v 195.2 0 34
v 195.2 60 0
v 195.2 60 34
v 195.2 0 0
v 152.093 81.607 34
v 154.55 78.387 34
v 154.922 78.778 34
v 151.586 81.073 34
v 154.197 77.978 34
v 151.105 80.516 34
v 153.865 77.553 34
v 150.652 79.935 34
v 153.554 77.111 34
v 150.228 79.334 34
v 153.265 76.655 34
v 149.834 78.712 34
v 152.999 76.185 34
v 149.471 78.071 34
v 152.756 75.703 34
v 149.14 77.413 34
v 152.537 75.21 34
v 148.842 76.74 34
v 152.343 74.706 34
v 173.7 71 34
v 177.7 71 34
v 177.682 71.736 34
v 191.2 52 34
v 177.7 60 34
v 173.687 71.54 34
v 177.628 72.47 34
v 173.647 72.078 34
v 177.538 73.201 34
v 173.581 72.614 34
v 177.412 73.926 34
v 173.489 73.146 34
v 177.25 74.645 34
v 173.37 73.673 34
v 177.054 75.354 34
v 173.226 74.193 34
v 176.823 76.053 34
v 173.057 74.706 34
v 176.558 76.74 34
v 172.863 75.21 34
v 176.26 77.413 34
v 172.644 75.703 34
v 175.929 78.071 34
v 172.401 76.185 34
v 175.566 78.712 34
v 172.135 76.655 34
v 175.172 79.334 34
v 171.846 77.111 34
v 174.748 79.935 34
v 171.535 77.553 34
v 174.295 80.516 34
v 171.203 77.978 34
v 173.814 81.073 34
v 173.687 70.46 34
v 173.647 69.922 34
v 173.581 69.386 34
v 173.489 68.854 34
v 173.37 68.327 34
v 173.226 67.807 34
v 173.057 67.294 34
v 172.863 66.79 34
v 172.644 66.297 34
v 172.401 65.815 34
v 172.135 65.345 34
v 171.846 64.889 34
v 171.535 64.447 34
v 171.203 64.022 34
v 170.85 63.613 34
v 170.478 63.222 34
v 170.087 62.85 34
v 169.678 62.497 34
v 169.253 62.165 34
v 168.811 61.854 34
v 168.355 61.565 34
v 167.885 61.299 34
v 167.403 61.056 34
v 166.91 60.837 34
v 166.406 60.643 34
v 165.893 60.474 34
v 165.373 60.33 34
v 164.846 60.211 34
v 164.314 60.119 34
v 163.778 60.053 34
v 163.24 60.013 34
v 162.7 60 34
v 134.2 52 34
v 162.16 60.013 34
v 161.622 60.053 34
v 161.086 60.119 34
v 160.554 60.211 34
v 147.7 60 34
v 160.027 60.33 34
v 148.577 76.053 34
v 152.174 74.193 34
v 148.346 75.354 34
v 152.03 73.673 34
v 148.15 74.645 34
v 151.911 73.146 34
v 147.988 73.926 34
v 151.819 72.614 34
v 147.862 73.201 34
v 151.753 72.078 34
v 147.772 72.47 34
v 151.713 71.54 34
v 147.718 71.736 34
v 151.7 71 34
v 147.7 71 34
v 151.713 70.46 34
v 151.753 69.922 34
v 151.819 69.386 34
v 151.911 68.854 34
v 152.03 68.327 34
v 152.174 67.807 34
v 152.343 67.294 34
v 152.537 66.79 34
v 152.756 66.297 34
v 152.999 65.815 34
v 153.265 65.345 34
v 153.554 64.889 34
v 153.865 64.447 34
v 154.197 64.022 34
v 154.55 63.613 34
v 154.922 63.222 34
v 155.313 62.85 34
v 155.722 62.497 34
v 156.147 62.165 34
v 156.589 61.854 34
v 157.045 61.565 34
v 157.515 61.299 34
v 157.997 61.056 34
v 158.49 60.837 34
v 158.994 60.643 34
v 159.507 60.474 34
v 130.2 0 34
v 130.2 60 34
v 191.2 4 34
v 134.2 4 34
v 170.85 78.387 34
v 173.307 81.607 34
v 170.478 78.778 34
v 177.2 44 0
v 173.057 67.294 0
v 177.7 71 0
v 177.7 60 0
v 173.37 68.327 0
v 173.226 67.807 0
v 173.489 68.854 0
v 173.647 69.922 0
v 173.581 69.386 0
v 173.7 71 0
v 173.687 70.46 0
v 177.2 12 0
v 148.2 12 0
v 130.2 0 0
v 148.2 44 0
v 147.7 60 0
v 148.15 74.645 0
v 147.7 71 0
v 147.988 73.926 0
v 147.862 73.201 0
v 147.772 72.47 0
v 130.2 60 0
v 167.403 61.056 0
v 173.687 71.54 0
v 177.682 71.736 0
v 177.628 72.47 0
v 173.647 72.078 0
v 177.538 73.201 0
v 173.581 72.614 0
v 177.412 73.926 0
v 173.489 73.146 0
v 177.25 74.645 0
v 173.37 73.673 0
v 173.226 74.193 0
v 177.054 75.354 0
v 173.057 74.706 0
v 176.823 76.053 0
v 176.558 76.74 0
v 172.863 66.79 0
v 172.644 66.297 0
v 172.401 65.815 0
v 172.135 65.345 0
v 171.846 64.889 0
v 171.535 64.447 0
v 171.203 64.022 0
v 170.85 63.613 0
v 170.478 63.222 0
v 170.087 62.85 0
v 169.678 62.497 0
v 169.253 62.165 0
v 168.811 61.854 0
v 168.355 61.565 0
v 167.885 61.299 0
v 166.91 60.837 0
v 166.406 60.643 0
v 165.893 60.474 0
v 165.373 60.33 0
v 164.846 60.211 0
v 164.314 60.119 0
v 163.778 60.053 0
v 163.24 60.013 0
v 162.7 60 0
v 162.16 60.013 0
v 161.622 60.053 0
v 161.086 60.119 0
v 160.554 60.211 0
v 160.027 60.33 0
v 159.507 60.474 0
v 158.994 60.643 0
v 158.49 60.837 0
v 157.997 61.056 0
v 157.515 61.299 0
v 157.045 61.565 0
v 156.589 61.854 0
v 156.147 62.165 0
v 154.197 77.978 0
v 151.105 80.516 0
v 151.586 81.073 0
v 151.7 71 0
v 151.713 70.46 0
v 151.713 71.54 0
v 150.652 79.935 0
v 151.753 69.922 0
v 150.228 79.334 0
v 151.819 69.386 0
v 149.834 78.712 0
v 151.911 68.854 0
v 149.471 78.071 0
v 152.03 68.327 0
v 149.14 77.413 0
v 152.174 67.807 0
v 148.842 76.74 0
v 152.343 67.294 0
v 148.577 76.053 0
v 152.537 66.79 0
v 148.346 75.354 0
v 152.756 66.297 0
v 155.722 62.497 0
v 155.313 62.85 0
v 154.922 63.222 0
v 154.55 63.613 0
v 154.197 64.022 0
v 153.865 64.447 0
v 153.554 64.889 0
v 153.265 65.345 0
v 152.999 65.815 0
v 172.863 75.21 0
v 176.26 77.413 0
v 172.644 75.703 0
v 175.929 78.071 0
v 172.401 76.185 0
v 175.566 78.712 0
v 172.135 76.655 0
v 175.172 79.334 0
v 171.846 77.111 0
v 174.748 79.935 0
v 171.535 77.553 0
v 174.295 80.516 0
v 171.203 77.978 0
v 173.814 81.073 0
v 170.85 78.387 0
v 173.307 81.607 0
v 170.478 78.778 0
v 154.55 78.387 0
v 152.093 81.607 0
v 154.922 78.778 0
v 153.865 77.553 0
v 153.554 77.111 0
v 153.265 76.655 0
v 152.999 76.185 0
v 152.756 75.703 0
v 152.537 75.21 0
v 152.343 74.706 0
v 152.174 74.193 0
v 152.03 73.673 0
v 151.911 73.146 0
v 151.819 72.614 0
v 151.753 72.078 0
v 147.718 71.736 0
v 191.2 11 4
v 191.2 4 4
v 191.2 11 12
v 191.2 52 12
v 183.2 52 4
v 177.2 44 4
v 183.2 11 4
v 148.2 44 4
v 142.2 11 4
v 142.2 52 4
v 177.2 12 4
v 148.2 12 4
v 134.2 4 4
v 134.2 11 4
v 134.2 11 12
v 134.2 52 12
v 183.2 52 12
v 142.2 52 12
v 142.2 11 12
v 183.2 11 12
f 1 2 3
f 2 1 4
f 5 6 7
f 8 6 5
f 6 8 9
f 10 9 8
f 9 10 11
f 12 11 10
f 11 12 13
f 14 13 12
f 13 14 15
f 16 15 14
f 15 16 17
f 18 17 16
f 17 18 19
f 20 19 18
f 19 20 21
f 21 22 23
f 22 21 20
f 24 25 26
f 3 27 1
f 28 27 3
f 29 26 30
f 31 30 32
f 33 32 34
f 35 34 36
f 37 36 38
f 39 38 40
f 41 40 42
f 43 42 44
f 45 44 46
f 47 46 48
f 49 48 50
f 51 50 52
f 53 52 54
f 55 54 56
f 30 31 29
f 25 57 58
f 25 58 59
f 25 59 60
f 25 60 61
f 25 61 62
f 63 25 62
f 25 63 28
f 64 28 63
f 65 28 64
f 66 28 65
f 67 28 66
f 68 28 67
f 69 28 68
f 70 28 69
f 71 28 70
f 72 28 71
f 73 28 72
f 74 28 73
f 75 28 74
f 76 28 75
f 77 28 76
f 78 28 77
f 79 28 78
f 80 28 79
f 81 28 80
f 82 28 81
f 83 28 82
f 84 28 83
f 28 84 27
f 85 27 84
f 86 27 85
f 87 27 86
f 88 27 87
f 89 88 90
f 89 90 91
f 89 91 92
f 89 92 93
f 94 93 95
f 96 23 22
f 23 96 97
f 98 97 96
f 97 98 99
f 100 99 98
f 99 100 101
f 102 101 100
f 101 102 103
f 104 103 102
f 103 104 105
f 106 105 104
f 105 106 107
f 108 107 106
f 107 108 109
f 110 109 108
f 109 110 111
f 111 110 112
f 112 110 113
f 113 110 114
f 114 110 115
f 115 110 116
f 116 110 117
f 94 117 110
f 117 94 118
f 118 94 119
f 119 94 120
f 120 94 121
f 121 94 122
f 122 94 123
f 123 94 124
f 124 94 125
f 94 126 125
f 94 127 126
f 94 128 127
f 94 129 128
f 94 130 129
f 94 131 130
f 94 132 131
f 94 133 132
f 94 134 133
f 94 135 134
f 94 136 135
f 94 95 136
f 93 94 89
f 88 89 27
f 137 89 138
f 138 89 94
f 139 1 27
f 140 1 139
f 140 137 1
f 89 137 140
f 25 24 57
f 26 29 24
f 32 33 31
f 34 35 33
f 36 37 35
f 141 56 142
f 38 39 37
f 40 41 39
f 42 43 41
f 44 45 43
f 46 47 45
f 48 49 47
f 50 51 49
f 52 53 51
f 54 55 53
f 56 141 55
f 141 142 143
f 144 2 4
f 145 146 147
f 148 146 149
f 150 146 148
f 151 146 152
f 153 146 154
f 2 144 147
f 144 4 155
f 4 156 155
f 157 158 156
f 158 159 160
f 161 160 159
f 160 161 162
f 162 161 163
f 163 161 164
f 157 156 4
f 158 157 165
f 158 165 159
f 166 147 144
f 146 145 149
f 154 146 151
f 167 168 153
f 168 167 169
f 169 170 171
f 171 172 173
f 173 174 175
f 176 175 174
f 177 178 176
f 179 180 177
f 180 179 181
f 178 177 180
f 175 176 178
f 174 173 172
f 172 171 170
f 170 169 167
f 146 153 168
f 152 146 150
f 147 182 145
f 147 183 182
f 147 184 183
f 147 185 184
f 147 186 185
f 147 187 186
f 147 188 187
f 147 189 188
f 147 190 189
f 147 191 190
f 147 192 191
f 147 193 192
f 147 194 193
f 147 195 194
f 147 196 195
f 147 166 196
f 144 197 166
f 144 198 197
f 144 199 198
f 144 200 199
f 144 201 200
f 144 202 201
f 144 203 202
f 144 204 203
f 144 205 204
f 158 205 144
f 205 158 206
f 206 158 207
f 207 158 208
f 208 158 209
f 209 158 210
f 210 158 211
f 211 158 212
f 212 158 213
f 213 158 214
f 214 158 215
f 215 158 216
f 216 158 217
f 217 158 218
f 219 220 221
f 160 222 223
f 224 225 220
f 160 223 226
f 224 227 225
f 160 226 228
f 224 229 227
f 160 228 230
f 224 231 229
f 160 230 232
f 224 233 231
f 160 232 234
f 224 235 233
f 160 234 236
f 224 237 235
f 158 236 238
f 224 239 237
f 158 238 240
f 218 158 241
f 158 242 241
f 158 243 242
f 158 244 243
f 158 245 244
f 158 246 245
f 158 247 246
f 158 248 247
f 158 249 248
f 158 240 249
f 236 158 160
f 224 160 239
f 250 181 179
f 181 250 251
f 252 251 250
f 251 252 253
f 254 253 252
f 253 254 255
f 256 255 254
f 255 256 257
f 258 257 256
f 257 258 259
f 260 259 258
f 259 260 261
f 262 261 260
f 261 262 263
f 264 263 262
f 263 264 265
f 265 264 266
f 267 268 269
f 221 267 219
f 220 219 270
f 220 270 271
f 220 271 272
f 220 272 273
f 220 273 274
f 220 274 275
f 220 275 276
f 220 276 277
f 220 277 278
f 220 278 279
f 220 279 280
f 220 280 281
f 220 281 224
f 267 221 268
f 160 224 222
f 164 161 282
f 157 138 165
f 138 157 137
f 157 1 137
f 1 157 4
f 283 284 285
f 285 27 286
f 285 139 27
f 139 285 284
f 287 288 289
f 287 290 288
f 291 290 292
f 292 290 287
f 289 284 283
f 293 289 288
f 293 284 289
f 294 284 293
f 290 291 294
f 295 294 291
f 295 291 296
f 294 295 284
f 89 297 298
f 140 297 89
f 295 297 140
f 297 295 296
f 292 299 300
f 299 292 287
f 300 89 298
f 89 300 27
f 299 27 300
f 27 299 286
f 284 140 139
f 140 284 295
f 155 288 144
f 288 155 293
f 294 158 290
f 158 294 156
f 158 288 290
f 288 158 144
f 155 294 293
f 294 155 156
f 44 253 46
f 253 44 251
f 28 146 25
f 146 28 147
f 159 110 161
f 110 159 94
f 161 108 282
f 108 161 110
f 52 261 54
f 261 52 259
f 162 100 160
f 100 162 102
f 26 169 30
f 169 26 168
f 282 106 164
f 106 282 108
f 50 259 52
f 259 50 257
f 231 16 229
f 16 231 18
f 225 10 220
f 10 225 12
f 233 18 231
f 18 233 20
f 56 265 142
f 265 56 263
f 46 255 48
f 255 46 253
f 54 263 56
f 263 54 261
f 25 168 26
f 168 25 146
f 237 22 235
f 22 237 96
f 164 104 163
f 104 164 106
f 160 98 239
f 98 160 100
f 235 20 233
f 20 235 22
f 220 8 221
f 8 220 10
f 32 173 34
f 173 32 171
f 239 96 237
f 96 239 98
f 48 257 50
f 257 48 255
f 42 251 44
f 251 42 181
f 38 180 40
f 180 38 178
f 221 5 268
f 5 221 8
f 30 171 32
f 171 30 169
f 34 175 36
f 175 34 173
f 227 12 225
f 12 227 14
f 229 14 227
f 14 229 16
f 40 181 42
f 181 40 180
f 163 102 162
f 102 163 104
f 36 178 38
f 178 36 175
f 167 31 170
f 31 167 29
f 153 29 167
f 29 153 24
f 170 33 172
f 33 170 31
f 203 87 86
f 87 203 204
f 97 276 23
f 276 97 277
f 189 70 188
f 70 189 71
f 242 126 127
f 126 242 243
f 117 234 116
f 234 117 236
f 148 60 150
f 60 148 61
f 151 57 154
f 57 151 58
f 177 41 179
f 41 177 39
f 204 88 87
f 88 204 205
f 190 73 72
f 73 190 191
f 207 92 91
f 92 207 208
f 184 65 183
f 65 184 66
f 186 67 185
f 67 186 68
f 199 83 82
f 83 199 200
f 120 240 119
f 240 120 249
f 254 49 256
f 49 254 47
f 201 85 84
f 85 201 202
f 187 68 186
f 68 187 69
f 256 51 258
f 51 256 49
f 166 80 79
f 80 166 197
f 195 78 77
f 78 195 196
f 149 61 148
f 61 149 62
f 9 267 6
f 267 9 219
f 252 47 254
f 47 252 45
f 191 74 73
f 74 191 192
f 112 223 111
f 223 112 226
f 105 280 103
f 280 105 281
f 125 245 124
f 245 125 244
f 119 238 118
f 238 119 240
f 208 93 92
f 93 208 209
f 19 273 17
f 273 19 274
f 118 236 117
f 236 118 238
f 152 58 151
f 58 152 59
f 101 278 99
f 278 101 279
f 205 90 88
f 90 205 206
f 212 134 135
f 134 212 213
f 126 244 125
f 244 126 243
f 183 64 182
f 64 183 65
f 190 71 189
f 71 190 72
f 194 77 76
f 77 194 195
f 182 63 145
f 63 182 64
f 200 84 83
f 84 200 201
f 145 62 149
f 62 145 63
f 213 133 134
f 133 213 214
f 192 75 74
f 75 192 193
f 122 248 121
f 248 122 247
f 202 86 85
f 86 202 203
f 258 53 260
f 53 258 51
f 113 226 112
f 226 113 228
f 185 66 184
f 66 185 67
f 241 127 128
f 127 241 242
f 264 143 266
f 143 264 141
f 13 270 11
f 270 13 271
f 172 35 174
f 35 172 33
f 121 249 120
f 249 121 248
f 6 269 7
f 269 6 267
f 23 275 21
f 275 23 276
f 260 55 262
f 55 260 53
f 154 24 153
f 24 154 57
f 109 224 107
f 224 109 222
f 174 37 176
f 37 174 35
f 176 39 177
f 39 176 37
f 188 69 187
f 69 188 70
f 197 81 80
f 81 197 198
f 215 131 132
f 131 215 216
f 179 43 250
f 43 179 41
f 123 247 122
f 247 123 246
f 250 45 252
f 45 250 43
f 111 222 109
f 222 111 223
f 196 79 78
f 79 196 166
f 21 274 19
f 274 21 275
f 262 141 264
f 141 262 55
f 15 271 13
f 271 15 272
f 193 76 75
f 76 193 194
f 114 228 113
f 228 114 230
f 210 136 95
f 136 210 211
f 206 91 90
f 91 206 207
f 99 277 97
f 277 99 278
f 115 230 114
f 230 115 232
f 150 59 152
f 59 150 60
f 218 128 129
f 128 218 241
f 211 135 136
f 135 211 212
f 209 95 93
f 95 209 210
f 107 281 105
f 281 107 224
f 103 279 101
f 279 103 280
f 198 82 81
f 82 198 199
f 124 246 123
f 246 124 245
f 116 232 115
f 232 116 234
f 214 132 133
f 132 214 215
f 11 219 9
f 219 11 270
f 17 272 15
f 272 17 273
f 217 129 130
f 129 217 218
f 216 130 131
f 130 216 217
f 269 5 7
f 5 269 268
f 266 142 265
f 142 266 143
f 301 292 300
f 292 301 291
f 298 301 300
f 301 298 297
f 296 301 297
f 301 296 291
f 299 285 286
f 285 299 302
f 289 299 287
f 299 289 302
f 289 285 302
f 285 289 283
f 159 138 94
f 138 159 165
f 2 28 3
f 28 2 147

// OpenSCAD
$fn= $preview ? 32 : 128;
ps_x = 163;
ps_y = 42;
ps_z = 38;

strain_relief_x = 10;
strain_relief_y = 15;
strain_relief_z = 10;
strain_relief_wall = 2;
cable_diam = 5;

screw_diam=3;
screw_z=5;
screw_thread_diam=4.5;
screw_thread_z = 4;
screw_thread_wall = 2;

toggle_x = 13;
toggle_y = 19.5;
toggle_z = 22;

x_max = 220;

wall_thickness = 2;
space = 3;

holder_wall = 4;
holder_clip_diam = 22;
holder_z = 30;

// psBox();
// translate([1.5*ps_y, 0, 0]) psboxLid();
translate([3.1*ps_y, 0, 0]) psBoxHolder();


module psboxLid() {
    lid_space = 0.1;
    difference() {
        cube([ps_y+2*space+4*wall_thickness, x_max+2*space+4*wall_thickness,3*wall_thickness]);
        difference() {
            translate([wall_thickness - lid_space,wall_thickness - lid_space,2*wall_thickness]) cube([ps_y+2*space+2*wall_thickness+2*lid_space, x_max+2*space+2*wall_thickness+2*lid_space,wall_thickness]);
            translate([2*wall_thickness + lid_space,2*wall_thickness + lid_space,2*wall_thickness]) cube([ps_y+2*space-2*lid_space, x_max+2*space-2*lid_space,wall_thickness]);
        }
        translate([3*wall_thickness,3*wall_thickness,2*wall_thickness]) cube([ps_y + wall_thickness, x_max + wall_thickness,wall_thickness]);
        translate([ps_y/2 - space,27 + wall_thickness,0]) cube([toggle_y, toggle_x,toggle_z]);

    }
}

module psBox() {
    difference() {
        union() {
            difference() {
                cube([ps_y+2*space+2*wall_thickness, x_max+2*space+2*wall_thickness,ps_z + space + wall_thickness]);
                translate([wall_thickness, wall_thickness, wall_thickness]) cube([ps_y+2*space, x_max+2*space,ps_z + space]);
            }
            translate([(ps_y+2*wall_thickness+2*space)-(strain_relief_y+2*strain_relief_wall),wall_thickness,wall_thickness]) cableHole();
            translate([0,x_max+wall_thickness+2*space,wall_thickness]) mirror([0,1,0]) cableHole();

            // 4mm distance for screwhole in pc
            ps_screw_posx = wall_thickness + (screw_thread_diam+screw_thread_wall)/2 + 4; 
            ps_screw_posy = (x_max+wall_thickness+space)-(strain_relief_x+screw_thread_wall) - 5 - 4; // 5 is arbitrary distance

            translate([ps_screw_posx, ps_screw_posy, wall_thickness]) pcScrewThread();
            translate([ps_screw_posx+ps_y-2*4, ps_screw_posy-(ps_x-2*4), wall_thickness]) pcScrewThread();
        }
        translate([(ps_y+2*wall_thickness+2*space)-(strain_relief_y+2*strain_relief_wall)/2,wall_thickness,3*wall_thickness]) rotate([90,0,0]) cylinder(h=wall_thickness, d=cable_diam);
        translate([(strain_relief_y+2*strain_relief_wall)/2,x_max+wall_thickness+2*space+wall_thickness,3*wall_thickness]) rotate([90,0,0]) cylinder(h=wall_thickness, d=cable_diam);
    }
}

module cableHole() {
    difference() {
        cube([strain_relief_y + 2*strain_relief_wall, strain_relief_x + strain_relief_wall, strain_relief_z]);
        translate([strain_relief_wall,0,0])cube([strain_relief_y,strain_relief_x,strain_relief_z]);
        translate([-1, strain_relief_x/2, strain_relief_z/2]) rotate([0,90,0]) cylinder(h=strain_relief_y+2*strain_relief_wall+2, d=cable_diam);
    }
}

module pcScrewThread() {
    difference() {
        cylinder(h=screw_z+1, d=screw_thread_diam+2*screw_thread_wall);
        translate([0,0,1]) cylinder(h=screw_z, d=screw_thread_diam);
    }
}

module psBoxHolder () {
    holder_x = ps_y + 2* space + 4*wall_thickness + 1;
    holder_y = ps_z + 2* space + 2*wall_thickness;    
    holder_rail_z = 8;
    holder_rail_x = 4*wall_thickness;

    union() {
        difference() {
            cube([holder_x + 2*holder_wall, holder_y + 2*holder_wall, holder_z + holder_wall]);
            translate([holder_wall, holder_wall, holder_wall]) cube([holder_x, holder_y, holder_z]);
            translate ([(holder_wall+holder_rail_z)*1.5, holder_wall+holder_rail_z, 0]) cube([(holder_x + 2*holder_wall)-(holder_wall+holder_rail_z)*3, (holder_y + 2*holder_wall)-(holder_wall+holder_rail_z)*2, holder_wall]);
        }

        translate([holder_wall, holder_wall+3*wall_thickness + 1, holder_wall]) cube([holder_rail_x, holder_y - 2*wall_thickness, holder_rail_z]);
        translate([holder_x+holder_wall-holder_rail_x, holder_wall+3*wall_thickness+1, holder_wall]) cube([holder_rail_x, holder_y - 2*wall_thickness, holder_rail_z]);
        
        translate([0,holder_y+2*holder_wall,0])cube([holder_x+2*holder_wall,holder_wall,holder_z+holder_wall]);
        translate([(holder_clip_diam+2*holder_wall)/2+(holder_x-holder_clip_diam)/2,holder_y+3*holder_wall+holder_clip_diam/2,0]) psBoxHolderClip();
    }


}

module psBoxHolderClip() {
    holder_clip_x = holder_clip_diam+2*holder_wall;
    holder_clip_z = holder_z + holder_wall;
    difference() {
        hull() {
            cylinder(h=holder_clip_z, d=holder_clip_x);
            translate([holder_clip_x/-2,holder_clip_x/-2,0]) cube([holder_clip_x, holder_wall, holder_clip_z]);
        }
        cylinder(h=holder_clip_z, d=holder_clip_diam);
        rotate([0,0,45]) cube([holder_clip_z,holder_clip_z,holder_clip_z]);
    }
}
